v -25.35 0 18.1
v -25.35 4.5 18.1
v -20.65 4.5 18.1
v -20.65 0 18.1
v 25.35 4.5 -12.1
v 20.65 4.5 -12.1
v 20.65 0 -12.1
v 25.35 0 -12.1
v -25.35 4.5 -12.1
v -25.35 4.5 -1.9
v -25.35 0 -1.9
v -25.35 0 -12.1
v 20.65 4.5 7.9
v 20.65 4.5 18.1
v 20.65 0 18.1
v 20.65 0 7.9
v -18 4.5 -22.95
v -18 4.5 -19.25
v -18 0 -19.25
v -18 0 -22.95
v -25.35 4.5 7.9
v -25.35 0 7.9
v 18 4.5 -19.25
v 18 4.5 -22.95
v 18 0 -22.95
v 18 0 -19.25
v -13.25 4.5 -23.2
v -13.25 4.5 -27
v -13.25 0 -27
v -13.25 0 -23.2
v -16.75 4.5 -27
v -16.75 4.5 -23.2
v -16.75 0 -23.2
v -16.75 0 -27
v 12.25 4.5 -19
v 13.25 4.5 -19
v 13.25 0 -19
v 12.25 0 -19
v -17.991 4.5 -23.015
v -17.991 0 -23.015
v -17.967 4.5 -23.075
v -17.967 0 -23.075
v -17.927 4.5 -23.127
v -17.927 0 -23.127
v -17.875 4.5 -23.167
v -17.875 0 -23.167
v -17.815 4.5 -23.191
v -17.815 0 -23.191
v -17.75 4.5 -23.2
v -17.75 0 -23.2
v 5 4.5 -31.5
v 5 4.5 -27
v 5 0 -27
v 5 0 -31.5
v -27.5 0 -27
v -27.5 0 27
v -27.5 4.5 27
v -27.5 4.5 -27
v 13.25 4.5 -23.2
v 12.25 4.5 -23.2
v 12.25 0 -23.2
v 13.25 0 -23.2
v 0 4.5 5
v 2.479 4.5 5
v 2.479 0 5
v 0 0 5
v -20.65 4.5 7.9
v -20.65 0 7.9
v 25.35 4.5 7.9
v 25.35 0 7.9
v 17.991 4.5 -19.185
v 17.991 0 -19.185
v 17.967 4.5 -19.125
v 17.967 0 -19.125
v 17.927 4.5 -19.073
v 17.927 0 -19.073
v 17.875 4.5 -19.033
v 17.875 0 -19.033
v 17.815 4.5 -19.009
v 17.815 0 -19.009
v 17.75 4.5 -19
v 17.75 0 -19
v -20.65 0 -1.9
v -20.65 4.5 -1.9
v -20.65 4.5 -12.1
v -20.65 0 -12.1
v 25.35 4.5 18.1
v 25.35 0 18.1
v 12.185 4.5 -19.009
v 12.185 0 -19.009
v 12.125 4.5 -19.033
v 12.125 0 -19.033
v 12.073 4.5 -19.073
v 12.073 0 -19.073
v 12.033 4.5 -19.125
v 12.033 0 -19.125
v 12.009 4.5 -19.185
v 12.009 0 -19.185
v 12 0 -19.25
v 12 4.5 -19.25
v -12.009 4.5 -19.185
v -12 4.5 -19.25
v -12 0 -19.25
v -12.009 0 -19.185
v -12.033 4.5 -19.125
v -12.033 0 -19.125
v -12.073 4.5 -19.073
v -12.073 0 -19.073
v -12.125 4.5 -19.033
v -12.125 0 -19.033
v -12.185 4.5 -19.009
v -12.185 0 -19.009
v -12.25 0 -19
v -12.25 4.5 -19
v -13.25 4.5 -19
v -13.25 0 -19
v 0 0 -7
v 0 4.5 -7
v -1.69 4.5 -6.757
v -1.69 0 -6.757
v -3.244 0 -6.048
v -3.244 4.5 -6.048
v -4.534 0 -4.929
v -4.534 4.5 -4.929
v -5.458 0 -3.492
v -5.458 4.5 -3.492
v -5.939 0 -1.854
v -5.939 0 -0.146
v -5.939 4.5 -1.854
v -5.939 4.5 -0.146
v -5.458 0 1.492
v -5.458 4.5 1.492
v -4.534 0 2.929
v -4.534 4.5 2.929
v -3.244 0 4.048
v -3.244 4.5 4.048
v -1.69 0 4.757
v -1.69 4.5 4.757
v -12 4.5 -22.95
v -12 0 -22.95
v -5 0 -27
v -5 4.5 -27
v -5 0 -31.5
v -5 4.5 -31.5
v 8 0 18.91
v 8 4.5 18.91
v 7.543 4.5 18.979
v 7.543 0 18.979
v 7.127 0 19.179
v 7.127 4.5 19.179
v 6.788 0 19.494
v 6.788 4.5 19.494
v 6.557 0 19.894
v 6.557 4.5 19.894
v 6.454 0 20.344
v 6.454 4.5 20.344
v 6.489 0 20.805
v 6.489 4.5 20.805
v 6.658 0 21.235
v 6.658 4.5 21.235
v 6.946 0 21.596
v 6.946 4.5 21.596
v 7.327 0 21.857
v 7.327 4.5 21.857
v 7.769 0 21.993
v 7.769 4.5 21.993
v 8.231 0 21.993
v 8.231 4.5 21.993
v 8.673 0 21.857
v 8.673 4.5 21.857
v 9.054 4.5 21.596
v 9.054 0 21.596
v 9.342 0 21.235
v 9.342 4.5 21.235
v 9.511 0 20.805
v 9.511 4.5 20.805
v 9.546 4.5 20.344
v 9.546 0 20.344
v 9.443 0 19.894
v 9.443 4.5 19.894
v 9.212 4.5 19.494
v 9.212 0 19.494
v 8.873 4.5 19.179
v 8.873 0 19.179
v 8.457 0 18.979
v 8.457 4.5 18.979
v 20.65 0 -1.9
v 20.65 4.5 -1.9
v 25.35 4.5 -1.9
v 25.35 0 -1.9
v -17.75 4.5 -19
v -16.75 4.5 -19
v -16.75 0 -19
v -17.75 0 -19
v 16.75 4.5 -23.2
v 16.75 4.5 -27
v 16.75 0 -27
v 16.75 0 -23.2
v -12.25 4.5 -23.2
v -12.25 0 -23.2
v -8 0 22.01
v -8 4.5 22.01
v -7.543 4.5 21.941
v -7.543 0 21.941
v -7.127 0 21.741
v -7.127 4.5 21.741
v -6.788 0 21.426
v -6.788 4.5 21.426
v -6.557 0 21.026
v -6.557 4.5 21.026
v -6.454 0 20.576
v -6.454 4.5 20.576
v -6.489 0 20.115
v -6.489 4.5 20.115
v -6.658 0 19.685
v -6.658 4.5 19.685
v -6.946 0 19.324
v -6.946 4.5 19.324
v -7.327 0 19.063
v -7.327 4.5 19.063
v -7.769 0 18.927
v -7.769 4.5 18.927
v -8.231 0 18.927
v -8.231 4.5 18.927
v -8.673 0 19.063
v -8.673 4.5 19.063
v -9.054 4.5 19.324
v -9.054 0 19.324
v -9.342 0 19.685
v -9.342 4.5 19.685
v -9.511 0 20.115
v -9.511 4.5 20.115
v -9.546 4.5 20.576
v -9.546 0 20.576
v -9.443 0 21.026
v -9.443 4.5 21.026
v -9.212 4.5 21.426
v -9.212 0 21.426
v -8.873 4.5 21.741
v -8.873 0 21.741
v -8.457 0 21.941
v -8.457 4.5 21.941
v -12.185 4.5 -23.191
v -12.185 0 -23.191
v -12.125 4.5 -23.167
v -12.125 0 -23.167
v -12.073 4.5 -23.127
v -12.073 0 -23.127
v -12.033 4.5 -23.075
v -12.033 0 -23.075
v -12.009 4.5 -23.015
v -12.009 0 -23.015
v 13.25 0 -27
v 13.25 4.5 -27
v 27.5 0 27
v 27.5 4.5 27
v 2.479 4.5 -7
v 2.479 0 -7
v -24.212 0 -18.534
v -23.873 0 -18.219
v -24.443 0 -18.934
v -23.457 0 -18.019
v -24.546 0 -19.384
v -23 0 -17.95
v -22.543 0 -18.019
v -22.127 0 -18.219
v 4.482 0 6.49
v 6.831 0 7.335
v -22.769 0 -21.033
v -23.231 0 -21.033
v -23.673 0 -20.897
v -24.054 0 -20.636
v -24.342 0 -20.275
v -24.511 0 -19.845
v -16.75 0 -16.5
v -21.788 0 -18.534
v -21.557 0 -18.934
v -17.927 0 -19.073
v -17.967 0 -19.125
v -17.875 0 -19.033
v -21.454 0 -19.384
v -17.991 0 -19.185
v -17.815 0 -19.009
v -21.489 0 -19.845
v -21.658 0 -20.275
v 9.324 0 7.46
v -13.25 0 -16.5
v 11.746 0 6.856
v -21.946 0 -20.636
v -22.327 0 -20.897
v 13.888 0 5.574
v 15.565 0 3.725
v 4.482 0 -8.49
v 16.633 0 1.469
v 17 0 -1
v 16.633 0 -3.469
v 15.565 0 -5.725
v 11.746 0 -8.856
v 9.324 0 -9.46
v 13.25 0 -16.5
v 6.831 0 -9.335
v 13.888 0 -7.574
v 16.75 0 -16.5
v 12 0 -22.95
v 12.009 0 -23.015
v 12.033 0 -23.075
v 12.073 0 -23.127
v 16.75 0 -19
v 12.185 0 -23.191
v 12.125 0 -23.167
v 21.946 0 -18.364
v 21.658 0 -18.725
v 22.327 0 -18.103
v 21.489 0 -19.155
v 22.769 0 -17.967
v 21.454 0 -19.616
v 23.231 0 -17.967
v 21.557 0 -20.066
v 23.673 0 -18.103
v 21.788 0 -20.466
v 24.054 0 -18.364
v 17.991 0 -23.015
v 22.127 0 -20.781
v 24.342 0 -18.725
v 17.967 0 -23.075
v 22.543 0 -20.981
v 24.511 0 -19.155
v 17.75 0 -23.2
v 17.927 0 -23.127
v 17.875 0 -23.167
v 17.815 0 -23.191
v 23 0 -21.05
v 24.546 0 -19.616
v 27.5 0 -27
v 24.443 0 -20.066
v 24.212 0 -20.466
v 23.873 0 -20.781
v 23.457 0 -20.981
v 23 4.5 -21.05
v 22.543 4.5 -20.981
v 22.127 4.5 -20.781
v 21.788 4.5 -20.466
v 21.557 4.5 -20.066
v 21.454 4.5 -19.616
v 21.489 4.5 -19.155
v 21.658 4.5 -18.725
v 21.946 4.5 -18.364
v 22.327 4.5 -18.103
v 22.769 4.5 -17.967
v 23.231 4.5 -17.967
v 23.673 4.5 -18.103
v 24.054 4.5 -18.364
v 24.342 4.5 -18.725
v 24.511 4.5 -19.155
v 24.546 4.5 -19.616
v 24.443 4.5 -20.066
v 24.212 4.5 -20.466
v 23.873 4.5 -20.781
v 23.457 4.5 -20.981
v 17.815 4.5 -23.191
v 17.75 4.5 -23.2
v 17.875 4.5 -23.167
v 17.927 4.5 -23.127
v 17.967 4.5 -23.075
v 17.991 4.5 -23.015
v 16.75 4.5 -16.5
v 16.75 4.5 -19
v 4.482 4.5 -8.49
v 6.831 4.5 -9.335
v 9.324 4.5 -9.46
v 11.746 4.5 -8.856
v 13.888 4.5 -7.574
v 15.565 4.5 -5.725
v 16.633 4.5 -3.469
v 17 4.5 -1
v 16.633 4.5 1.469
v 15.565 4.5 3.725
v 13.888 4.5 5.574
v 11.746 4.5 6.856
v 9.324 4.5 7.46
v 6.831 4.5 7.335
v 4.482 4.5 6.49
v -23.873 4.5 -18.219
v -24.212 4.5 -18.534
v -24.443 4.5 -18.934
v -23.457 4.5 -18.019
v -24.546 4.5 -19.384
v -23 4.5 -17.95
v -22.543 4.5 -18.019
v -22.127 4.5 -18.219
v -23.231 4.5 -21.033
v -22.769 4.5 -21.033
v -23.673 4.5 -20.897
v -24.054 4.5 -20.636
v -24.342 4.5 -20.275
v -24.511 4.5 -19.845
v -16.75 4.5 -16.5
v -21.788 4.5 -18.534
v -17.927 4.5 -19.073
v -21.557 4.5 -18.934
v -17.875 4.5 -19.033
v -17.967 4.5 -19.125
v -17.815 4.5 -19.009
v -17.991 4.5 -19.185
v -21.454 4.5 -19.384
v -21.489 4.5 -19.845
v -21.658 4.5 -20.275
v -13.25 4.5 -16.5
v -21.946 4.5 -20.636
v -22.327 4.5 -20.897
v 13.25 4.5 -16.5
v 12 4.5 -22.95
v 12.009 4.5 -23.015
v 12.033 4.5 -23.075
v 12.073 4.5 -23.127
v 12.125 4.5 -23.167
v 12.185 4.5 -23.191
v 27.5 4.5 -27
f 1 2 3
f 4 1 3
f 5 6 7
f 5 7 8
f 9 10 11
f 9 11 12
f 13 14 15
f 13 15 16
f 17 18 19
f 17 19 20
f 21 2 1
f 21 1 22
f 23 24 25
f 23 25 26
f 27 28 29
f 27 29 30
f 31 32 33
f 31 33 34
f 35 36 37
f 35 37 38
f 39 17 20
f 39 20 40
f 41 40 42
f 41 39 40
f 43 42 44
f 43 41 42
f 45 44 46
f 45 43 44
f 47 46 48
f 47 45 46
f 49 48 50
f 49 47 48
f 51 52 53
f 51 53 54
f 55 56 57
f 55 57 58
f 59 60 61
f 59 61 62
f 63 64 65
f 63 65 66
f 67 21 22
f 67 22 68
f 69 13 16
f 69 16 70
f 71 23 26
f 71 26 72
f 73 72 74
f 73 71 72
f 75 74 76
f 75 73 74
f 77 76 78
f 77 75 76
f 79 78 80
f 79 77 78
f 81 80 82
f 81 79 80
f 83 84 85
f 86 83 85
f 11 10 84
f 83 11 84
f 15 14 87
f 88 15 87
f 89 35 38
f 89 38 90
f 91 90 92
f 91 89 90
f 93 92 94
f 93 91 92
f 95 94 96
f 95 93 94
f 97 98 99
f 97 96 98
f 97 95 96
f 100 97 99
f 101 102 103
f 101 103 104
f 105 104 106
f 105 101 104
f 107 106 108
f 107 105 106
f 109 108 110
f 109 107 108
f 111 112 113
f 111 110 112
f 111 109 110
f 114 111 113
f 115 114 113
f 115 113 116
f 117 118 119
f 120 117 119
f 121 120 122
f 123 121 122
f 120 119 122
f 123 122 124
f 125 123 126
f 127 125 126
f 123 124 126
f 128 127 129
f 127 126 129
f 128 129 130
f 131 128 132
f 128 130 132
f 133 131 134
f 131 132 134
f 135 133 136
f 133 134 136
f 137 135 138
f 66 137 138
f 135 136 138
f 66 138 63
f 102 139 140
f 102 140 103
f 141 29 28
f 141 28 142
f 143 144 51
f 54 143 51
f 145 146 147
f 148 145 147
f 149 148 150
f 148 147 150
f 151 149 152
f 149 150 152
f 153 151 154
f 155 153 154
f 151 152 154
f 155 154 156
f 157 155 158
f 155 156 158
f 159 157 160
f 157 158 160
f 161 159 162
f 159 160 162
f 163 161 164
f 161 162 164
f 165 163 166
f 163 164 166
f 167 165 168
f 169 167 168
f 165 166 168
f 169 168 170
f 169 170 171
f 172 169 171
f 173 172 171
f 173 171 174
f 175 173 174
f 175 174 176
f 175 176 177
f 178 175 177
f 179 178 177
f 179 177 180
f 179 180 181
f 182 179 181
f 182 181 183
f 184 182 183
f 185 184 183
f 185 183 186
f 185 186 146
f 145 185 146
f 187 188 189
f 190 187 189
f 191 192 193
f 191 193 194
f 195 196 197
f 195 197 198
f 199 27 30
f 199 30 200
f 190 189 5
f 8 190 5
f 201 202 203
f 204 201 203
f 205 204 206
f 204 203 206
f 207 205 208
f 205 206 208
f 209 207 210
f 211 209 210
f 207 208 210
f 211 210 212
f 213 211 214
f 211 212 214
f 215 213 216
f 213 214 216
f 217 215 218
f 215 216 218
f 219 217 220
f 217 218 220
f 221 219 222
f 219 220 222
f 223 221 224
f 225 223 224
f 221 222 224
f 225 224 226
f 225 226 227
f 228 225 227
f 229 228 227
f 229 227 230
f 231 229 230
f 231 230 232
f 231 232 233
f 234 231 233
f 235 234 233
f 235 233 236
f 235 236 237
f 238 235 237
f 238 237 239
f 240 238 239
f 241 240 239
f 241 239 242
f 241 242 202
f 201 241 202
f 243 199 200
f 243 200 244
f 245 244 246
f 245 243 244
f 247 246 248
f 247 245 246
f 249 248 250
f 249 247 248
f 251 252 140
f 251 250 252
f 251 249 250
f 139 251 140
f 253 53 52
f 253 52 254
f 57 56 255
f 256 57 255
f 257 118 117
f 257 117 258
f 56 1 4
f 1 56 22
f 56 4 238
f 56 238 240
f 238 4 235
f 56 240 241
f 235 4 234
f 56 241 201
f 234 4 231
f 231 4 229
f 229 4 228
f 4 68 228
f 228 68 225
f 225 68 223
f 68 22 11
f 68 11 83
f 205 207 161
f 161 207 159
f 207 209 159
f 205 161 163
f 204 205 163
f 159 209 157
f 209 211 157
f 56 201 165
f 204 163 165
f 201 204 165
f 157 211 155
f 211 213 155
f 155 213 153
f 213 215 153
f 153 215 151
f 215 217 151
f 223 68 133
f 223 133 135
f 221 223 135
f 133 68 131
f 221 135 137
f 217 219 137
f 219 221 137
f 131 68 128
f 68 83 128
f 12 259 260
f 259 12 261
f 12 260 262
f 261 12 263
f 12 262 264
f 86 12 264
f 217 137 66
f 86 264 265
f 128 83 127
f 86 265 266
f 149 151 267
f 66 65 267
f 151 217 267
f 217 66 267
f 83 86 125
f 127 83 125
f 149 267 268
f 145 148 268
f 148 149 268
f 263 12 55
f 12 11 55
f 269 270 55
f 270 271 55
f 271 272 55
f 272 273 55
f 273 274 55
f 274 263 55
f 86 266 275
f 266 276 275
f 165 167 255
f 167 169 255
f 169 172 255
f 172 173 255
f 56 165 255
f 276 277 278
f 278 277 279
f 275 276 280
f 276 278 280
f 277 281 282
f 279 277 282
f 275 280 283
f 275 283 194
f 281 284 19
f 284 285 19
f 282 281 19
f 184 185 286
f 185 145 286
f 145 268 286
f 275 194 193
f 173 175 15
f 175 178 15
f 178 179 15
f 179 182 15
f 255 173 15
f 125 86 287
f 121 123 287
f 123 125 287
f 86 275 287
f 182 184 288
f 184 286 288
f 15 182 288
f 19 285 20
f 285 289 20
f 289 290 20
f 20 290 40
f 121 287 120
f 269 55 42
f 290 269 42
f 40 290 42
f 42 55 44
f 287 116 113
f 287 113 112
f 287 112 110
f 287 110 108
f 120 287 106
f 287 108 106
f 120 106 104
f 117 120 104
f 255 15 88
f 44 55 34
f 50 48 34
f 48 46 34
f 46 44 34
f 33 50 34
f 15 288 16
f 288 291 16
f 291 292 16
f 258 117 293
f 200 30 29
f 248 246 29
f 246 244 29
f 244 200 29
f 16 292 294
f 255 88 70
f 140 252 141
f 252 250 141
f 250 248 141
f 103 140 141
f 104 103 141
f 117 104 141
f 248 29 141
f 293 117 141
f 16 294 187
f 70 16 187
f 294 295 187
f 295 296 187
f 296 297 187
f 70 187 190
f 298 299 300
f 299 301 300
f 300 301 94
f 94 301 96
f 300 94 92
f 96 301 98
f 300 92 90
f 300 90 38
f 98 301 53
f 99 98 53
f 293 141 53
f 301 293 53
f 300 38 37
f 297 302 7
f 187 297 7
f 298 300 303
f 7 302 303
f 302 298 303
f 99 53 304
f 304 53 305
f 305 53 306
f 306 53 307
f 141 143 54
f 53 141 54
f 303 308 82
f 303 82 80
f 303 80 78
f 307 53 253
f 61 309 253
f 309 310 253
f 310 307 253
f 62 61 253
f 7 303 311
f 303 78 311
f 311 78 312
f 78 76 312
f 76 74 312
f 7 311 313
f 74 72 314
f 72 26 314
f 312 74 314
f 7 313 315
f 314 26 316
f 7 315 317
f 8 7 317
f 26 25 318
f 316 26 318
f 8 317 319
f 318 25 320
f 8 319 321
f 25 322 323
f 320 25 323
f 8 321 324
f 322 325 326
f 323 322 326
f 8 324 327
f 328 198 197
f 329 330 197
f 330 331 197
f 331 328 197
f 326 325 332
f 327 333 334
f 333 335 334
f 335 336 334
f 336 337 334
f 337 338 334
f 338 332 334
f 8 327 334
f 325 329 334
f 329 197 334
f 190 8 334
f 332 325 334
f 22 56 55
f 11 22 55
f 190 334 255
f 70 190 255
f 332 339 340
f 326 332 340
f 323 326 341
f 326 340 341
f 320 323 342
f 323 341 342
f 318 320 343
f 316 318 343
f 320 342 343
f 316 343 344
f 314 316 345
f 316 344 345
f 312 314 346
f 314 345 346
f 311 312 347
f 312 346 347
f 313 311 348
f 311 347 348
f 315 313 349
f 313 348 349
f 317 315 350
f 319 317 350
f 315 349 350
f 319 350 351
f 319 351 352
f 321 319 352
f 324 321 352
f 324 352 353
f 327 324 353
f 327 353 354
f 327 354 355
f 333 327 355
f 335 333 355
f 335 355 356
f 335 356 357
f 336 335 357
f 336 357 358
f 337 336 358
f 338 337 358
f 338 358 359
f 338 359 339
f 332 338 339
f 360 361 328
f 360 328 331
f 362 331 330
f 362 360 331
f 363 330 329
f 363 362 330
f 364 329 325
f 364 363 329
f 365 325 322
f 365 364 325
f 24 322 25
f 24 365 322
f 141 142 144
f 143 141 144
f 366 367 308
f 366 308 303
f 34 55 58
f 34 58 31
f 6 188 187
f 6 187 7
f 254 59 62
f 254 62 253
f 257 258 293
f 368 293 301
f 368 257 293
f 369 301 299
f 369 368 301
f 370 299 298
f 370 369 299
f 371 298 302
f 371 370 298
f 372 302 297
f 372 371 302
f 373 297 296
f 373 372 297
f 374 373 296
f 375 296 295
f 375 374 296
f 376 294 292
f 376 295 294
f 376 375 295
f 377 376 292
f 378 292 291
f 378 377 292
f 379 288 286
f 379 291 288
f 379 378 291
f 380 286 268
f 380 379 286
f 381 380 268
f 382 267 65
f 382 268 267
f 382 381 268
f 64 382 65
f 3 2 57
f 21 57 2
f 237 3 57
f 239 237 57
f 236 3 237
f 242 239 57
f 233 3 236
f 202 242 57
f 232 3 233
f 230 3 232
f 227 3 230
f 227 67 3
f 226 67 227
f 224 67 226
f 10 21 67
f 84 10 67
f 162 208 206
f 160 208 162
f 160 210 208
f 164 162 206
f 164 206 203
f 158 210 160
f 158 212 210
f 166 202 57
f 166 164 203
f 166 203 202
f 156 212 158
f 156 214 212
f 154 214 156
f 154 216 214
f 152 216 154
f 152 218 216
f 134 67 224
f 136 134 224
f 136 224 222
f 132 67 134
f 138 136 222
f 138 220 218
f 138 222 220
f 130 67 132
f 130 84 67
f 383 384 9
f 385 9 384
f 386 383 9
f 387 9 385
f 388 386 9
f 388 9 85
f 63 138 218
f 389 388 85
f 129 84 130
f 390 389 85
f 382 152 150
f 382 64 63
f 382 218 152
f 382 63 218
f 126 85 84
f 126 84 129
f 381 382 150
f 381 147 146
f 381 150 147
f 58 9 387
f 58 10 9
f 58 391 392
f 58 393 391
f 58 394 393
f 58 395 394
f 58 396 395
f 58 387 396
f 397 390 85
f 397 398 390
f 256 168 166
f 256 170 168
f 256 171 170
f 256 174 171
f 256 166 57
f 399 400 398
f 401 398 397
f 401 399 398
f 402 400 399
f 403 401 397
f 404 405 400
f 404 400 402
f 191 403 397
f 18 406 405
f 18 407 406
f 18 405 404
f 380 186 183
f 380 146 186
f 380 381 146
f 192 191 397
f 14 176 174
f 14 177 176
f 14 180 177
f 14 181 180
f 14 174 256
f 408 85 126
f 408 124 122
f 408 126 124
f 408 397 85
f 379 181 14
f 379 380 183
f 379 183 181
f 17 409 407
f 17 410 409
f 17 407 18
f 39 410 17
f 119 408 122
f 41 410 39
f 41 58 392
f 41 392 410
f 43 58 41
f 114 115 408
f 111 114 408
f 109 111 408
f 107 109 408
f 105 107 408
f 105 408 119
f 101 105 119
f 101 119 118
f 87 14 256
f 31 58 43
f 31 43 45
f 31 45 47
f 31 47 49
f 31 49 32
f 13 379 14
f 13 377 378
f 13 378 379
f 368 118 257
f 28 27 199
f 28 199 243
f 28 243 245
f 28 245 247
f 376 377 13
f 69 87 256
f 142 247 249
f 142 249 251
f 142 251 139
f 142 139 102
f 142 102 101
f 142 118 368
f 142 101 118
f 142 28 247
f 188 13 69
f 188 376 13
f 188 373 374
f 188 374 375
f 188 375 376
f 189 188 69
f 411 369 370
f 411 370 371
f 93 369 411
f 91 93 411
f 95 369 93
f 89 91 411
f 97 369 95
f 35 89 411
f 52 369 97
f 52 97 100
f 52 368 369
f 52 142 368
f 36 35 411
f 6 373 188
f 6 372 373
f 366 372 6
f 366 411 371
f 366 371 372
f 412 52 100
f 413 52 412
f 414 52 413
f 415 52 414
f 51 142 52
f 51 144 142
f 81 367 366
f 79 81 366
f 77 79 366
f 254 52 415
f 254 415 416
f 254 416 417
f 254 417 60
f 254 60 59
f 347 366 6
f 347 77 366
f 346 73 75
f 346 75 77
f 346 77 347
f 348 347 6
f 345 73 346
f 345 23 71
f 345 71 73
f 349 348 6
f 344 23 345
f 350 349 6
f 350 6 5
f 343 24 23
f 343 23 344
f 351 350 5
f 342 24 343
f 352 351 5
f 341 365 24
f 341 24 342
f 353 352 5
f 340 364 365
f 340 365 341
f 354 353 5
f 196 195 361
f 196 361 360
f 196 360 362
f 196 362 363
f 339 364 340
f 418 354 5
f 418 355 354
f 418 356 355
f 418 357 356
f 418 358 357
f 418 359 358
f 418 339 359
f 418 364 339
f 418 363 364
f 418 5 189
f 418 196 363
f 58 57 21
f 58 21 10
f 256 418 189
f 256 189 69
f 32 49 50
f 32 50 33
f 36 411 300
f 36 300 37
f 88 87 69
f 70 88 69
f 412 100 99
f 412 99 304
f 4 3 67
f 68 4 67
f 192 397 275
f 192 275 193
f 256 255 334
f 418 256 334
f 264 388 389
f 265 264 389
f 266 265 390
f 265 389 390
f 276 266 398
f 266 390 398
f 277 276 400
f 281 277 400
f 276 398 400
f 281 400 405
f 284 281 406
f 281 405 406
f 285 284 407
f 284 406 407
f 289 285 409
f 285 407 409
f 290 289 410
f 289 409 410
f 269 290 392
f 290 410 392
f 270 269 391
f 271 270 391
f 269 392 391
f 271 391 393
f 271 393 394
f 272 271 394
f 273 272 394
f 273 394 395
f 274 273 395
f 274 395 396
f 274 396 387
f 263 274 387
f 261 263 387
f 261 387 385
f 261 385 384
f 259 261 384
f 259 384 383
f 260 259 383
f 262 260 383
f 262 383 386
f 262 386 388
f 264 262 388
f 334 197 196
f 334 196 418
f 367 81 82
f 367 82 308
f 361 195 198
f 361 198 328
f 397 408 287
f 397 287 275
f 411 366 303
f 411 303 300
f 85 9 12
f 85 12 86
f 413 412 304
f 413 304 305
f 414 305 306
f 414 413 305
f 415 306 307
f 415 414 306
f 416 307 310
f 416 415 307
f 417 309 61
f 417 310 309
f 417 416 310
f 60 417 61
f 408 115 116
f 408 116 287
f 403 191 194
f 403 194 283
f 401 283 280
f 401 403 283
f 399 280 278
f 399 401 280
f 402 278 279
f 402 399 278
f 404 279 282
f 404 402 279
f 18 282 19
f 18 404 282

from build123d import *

# Parameters (mm, degrees)
SKETCH1_W           = 55
SKETCH1_H           = 54
MAINSHAPE_DEPTH     = 4.5
SKETCH2_W           = 10
SKETCH2_H           = 9
TAB1_DEPTH          = 4.5
CUT_EXTRUDE2_DEPTH  = 43.056509603
SKETCH5_W           = 4.7
SKETCH5_H           = 10.2
CUT_EXTRUDE3_DEPTH  = 43.056509603
SKETCH6_R           = 12
CUT_EXTRUDE4_DEPTH  = 43.056509603
SKETCH8_R           = 1.55
CUT_EXTRUDE6_DEPTH  = 43.056509603
SKETCH11_R          = 1.55
CUT_EXTRUDE8_DEPTH  = 43.056509603
SKETCH15_R          = 12
SKETCH15_R_2        = 6
BOSS_EXTRUDE2_DEPTH = 4.5
CUT_EXTRUDE10_DEPTH = 43.056509603


with BuildPart() as part:
    # Sketch1 → MainShape (new body)
    with BuildSketch(Plane(origin=(0, 0, 0), x_dir=(1, 0, 0), z_dir=(0, 1, 0))):
        Rectangle(SKETCH1_W, SKETCH1_H)
    extrude(amount=MAINSHAPE_DEPTH)

    # Sketch2 → Tab1 (add, through all)
    with BuildSketch(Plane(origin=(0, 4.5, 0), x_dir=(1, 0, 0), z_dir=(0, 1, 0))):
        with Locations((0, 27)):
            Rectangle(SKETCH2_W, SKETCH2_H)
    extrude(amount=-TAB1_DEPTH)

    # Sketch4 → Cut-Extrude2 (cut, through all)
    with BuildSketch(Plane(origin=(0, 4.5, 0), x_dir=(1, 0, 0), z_dir=(0, 1, 0))):
        with BuildLine():
            Line((-13.25, 16.5), (-16.75, 16.5))
            Line((-16.75, 16.5), (-16.75, 19))
            Line((-16.75, 19), (-17.75, 19))
            ThreePointArc((-17.75, 19), (-17.926776695, 19.073223305), (-18, 19.25))
            Line((-18, 19.25), (-18, 22.95))
            ThreePointArc((-18, 22.95), (-17.926776695, 23.126776695), (-17.75, 23.2))
            Line((-17.75, 23.2), (-16.75, 23.2))
            Line((-16.75, 23.2), (-16.75, 27))
            Line((-16.75, 27), (-13.25, 27))
            Line((-13.25, 27), (-13.25, 23.2))
            Line((-13.25, 23.2), (-12.25, 23.2))
            ThreePointArc((-12.25, 23.2), (-12.073223305, 23.126776695), (-12, 22.95))
            Line((-12, 22.95), (-12, 19.25))
            ThreePointArc((-12, 19.25), (-12.073223305, 19.073223305), (-12.25, 19))
            Line((-12.25, 19), (-13.25, 19))
            Line((-13.25, 19), (-13.25, 16.5))
        make_face()
        with BuildLine():
            Line((13.25, 16.5), (13.25, 19))
            Line((13.25, 19), (12.25, 19))
            ThreePointArc((12.25, 19), (12.073223305, 19.073223305), (12, 19.25))
            Line((12, 19.25), (12, 22.95))
            ThreePointArc((12, 22.95), (12.073223305, 23.126776695), (12.25, 23.2))
            Line((12.25, 23.2), (13.25, 23.2))
            Line((13.25, 23.2), (13.25, 27))
            Line((13.25, 27), (16.75, 27))
            Line((16.75, 27), (16.75, 23.2))
            Line((16.75, 23.2), (17.75, 23.2))
            ThreePointArc((17.75, 23.2), (17.926776695, 23.126776695), (18, 22.95))
            Line((18, 22.95), (18, 19.25))
            ThreePointArc((18, 19.25), (17.926776695, 19.073223305), (17.75, 19))
            Line((17.75, 19), (16.75, 19))
            Line((16.75, 19), (16.75, 16.5))
            Line((16.75, 16.5), (13.25, 16.5))
        make_face()
    extrude(amount=-CUT_EXTRUDE2_DEPTH, mode=Mode.SUBTRACT)

    # Sketch5 → Cut-Extrude3 (cut, through all)
    with BuildSketch(Plane(origin=(0, 4.5, 0), x_dir=(1, 0, 0), z_dir=(0, 1, 0))):
        with Locations((23, 7)):
            Rectangle(SKETCH5_W, SKETCH5_H)
        with Locations((-23, 7)):
            Rectangle(SKETCH5_W, SKETCH5_H)
        with Locations((-23, -13)):
            Rectangle(SKETCH5_W, SKETCH5_H)
        with Locations((23, -13)):
            Rectangle(SKETCH5_W, SKETCH5_H)
    extrude(amount=-CUT_EXTRUDE3_DEPTH, mode=Mode.SUBTRACT)

    # Sketch6 → Cut-Extrude4 (cut, through all)
    with BuildSketch(Plane(origin=(0, 4.5, 0), x_dir=(1, 0, 0), z_dir=(0, 1, 0))):
        with Locations(Location((0, 1, 0), (0, 0, 270))):
            Circle(SKETCH6_R)
    extrude(amount=-CUT_EXTRUDE4_DEPTH, mode=Mode.SUBTRACT)

    # Sketch8 → Cut-Extrude6 (cut, through all)
    with BuildSketch(Plane(origin=(0, 4.5, 0), x_dir=(1, 0, 0), z_dir=(0, 1, 0))):
        with Locations(Location((-8, -20.46, 0), (0, 0, 270))):
            Circle(SKETCH8_R)
        with Locations(Location((8, -20.46, 0), (0, 0, 90))):
            Circle(SKETCH8_R)
    extrude(amount=-CUT_EXTRUDE6_DEPTH, mode=Mode.SUBTRACT)

    # Sketch11 → Cut-Extrude8 (cut, through all)
    with BuildSketch(Plane(origin=(0, 4.5, 0), x_dir=(1, 0, 0), z_dir=(0, 1, 0))):
        with Locations(Location((-23, 19.5, 0), (0, 0, 270))):
            Circle(SKETCH11_R)
        with Locations(Location((23, 19.5, 0), (0, 0, 90))):
            Circle(SKETCH11_R)
    extrude(amount=-CUT_EXTRUDE8_DEPTH, mode=Mode.SUBTRACT)

    # Sketch15 → Boss-Extrude2 (add, through all)
    with BuildSketch(Plane(origin=(0, 4.5, 0), x_dir=(1, 0, 0), z_dir=(0, 1, 0))):
        with Locations((0, 1)):
            Circle(SKETCH15_R)
        with Locations(Location((0, 1, 0), (0, 0, 270))):
            Circle(SKETCH15_R_2, mode=Mode.SUBTRACT)
    extrude(amount=-BOSS_EXTRUDE2_DEPTH)

    # Sketch16 → Cut-Extrude10 (cut, through all)
    with BuildSketch(Plane(origin=(0, 4.5, 0), x_dir=(1, 0, 0), z_dir=(0, 1, 0))):
        with BuildLine():
            Line((0, 7), (2.479202711, 7))
            ThreePointArc((2.479202711, 7), (17, 1), (2.479202711, -5))
            Line((2.479202711, -5), (0, -5))
            Line((0, -5), (0, 7))
        make_face()
    extrude(amount=-CUT_EXTRUDE10_DEPTH, mode=Mode.SUBTRACT)


solid = part.part
